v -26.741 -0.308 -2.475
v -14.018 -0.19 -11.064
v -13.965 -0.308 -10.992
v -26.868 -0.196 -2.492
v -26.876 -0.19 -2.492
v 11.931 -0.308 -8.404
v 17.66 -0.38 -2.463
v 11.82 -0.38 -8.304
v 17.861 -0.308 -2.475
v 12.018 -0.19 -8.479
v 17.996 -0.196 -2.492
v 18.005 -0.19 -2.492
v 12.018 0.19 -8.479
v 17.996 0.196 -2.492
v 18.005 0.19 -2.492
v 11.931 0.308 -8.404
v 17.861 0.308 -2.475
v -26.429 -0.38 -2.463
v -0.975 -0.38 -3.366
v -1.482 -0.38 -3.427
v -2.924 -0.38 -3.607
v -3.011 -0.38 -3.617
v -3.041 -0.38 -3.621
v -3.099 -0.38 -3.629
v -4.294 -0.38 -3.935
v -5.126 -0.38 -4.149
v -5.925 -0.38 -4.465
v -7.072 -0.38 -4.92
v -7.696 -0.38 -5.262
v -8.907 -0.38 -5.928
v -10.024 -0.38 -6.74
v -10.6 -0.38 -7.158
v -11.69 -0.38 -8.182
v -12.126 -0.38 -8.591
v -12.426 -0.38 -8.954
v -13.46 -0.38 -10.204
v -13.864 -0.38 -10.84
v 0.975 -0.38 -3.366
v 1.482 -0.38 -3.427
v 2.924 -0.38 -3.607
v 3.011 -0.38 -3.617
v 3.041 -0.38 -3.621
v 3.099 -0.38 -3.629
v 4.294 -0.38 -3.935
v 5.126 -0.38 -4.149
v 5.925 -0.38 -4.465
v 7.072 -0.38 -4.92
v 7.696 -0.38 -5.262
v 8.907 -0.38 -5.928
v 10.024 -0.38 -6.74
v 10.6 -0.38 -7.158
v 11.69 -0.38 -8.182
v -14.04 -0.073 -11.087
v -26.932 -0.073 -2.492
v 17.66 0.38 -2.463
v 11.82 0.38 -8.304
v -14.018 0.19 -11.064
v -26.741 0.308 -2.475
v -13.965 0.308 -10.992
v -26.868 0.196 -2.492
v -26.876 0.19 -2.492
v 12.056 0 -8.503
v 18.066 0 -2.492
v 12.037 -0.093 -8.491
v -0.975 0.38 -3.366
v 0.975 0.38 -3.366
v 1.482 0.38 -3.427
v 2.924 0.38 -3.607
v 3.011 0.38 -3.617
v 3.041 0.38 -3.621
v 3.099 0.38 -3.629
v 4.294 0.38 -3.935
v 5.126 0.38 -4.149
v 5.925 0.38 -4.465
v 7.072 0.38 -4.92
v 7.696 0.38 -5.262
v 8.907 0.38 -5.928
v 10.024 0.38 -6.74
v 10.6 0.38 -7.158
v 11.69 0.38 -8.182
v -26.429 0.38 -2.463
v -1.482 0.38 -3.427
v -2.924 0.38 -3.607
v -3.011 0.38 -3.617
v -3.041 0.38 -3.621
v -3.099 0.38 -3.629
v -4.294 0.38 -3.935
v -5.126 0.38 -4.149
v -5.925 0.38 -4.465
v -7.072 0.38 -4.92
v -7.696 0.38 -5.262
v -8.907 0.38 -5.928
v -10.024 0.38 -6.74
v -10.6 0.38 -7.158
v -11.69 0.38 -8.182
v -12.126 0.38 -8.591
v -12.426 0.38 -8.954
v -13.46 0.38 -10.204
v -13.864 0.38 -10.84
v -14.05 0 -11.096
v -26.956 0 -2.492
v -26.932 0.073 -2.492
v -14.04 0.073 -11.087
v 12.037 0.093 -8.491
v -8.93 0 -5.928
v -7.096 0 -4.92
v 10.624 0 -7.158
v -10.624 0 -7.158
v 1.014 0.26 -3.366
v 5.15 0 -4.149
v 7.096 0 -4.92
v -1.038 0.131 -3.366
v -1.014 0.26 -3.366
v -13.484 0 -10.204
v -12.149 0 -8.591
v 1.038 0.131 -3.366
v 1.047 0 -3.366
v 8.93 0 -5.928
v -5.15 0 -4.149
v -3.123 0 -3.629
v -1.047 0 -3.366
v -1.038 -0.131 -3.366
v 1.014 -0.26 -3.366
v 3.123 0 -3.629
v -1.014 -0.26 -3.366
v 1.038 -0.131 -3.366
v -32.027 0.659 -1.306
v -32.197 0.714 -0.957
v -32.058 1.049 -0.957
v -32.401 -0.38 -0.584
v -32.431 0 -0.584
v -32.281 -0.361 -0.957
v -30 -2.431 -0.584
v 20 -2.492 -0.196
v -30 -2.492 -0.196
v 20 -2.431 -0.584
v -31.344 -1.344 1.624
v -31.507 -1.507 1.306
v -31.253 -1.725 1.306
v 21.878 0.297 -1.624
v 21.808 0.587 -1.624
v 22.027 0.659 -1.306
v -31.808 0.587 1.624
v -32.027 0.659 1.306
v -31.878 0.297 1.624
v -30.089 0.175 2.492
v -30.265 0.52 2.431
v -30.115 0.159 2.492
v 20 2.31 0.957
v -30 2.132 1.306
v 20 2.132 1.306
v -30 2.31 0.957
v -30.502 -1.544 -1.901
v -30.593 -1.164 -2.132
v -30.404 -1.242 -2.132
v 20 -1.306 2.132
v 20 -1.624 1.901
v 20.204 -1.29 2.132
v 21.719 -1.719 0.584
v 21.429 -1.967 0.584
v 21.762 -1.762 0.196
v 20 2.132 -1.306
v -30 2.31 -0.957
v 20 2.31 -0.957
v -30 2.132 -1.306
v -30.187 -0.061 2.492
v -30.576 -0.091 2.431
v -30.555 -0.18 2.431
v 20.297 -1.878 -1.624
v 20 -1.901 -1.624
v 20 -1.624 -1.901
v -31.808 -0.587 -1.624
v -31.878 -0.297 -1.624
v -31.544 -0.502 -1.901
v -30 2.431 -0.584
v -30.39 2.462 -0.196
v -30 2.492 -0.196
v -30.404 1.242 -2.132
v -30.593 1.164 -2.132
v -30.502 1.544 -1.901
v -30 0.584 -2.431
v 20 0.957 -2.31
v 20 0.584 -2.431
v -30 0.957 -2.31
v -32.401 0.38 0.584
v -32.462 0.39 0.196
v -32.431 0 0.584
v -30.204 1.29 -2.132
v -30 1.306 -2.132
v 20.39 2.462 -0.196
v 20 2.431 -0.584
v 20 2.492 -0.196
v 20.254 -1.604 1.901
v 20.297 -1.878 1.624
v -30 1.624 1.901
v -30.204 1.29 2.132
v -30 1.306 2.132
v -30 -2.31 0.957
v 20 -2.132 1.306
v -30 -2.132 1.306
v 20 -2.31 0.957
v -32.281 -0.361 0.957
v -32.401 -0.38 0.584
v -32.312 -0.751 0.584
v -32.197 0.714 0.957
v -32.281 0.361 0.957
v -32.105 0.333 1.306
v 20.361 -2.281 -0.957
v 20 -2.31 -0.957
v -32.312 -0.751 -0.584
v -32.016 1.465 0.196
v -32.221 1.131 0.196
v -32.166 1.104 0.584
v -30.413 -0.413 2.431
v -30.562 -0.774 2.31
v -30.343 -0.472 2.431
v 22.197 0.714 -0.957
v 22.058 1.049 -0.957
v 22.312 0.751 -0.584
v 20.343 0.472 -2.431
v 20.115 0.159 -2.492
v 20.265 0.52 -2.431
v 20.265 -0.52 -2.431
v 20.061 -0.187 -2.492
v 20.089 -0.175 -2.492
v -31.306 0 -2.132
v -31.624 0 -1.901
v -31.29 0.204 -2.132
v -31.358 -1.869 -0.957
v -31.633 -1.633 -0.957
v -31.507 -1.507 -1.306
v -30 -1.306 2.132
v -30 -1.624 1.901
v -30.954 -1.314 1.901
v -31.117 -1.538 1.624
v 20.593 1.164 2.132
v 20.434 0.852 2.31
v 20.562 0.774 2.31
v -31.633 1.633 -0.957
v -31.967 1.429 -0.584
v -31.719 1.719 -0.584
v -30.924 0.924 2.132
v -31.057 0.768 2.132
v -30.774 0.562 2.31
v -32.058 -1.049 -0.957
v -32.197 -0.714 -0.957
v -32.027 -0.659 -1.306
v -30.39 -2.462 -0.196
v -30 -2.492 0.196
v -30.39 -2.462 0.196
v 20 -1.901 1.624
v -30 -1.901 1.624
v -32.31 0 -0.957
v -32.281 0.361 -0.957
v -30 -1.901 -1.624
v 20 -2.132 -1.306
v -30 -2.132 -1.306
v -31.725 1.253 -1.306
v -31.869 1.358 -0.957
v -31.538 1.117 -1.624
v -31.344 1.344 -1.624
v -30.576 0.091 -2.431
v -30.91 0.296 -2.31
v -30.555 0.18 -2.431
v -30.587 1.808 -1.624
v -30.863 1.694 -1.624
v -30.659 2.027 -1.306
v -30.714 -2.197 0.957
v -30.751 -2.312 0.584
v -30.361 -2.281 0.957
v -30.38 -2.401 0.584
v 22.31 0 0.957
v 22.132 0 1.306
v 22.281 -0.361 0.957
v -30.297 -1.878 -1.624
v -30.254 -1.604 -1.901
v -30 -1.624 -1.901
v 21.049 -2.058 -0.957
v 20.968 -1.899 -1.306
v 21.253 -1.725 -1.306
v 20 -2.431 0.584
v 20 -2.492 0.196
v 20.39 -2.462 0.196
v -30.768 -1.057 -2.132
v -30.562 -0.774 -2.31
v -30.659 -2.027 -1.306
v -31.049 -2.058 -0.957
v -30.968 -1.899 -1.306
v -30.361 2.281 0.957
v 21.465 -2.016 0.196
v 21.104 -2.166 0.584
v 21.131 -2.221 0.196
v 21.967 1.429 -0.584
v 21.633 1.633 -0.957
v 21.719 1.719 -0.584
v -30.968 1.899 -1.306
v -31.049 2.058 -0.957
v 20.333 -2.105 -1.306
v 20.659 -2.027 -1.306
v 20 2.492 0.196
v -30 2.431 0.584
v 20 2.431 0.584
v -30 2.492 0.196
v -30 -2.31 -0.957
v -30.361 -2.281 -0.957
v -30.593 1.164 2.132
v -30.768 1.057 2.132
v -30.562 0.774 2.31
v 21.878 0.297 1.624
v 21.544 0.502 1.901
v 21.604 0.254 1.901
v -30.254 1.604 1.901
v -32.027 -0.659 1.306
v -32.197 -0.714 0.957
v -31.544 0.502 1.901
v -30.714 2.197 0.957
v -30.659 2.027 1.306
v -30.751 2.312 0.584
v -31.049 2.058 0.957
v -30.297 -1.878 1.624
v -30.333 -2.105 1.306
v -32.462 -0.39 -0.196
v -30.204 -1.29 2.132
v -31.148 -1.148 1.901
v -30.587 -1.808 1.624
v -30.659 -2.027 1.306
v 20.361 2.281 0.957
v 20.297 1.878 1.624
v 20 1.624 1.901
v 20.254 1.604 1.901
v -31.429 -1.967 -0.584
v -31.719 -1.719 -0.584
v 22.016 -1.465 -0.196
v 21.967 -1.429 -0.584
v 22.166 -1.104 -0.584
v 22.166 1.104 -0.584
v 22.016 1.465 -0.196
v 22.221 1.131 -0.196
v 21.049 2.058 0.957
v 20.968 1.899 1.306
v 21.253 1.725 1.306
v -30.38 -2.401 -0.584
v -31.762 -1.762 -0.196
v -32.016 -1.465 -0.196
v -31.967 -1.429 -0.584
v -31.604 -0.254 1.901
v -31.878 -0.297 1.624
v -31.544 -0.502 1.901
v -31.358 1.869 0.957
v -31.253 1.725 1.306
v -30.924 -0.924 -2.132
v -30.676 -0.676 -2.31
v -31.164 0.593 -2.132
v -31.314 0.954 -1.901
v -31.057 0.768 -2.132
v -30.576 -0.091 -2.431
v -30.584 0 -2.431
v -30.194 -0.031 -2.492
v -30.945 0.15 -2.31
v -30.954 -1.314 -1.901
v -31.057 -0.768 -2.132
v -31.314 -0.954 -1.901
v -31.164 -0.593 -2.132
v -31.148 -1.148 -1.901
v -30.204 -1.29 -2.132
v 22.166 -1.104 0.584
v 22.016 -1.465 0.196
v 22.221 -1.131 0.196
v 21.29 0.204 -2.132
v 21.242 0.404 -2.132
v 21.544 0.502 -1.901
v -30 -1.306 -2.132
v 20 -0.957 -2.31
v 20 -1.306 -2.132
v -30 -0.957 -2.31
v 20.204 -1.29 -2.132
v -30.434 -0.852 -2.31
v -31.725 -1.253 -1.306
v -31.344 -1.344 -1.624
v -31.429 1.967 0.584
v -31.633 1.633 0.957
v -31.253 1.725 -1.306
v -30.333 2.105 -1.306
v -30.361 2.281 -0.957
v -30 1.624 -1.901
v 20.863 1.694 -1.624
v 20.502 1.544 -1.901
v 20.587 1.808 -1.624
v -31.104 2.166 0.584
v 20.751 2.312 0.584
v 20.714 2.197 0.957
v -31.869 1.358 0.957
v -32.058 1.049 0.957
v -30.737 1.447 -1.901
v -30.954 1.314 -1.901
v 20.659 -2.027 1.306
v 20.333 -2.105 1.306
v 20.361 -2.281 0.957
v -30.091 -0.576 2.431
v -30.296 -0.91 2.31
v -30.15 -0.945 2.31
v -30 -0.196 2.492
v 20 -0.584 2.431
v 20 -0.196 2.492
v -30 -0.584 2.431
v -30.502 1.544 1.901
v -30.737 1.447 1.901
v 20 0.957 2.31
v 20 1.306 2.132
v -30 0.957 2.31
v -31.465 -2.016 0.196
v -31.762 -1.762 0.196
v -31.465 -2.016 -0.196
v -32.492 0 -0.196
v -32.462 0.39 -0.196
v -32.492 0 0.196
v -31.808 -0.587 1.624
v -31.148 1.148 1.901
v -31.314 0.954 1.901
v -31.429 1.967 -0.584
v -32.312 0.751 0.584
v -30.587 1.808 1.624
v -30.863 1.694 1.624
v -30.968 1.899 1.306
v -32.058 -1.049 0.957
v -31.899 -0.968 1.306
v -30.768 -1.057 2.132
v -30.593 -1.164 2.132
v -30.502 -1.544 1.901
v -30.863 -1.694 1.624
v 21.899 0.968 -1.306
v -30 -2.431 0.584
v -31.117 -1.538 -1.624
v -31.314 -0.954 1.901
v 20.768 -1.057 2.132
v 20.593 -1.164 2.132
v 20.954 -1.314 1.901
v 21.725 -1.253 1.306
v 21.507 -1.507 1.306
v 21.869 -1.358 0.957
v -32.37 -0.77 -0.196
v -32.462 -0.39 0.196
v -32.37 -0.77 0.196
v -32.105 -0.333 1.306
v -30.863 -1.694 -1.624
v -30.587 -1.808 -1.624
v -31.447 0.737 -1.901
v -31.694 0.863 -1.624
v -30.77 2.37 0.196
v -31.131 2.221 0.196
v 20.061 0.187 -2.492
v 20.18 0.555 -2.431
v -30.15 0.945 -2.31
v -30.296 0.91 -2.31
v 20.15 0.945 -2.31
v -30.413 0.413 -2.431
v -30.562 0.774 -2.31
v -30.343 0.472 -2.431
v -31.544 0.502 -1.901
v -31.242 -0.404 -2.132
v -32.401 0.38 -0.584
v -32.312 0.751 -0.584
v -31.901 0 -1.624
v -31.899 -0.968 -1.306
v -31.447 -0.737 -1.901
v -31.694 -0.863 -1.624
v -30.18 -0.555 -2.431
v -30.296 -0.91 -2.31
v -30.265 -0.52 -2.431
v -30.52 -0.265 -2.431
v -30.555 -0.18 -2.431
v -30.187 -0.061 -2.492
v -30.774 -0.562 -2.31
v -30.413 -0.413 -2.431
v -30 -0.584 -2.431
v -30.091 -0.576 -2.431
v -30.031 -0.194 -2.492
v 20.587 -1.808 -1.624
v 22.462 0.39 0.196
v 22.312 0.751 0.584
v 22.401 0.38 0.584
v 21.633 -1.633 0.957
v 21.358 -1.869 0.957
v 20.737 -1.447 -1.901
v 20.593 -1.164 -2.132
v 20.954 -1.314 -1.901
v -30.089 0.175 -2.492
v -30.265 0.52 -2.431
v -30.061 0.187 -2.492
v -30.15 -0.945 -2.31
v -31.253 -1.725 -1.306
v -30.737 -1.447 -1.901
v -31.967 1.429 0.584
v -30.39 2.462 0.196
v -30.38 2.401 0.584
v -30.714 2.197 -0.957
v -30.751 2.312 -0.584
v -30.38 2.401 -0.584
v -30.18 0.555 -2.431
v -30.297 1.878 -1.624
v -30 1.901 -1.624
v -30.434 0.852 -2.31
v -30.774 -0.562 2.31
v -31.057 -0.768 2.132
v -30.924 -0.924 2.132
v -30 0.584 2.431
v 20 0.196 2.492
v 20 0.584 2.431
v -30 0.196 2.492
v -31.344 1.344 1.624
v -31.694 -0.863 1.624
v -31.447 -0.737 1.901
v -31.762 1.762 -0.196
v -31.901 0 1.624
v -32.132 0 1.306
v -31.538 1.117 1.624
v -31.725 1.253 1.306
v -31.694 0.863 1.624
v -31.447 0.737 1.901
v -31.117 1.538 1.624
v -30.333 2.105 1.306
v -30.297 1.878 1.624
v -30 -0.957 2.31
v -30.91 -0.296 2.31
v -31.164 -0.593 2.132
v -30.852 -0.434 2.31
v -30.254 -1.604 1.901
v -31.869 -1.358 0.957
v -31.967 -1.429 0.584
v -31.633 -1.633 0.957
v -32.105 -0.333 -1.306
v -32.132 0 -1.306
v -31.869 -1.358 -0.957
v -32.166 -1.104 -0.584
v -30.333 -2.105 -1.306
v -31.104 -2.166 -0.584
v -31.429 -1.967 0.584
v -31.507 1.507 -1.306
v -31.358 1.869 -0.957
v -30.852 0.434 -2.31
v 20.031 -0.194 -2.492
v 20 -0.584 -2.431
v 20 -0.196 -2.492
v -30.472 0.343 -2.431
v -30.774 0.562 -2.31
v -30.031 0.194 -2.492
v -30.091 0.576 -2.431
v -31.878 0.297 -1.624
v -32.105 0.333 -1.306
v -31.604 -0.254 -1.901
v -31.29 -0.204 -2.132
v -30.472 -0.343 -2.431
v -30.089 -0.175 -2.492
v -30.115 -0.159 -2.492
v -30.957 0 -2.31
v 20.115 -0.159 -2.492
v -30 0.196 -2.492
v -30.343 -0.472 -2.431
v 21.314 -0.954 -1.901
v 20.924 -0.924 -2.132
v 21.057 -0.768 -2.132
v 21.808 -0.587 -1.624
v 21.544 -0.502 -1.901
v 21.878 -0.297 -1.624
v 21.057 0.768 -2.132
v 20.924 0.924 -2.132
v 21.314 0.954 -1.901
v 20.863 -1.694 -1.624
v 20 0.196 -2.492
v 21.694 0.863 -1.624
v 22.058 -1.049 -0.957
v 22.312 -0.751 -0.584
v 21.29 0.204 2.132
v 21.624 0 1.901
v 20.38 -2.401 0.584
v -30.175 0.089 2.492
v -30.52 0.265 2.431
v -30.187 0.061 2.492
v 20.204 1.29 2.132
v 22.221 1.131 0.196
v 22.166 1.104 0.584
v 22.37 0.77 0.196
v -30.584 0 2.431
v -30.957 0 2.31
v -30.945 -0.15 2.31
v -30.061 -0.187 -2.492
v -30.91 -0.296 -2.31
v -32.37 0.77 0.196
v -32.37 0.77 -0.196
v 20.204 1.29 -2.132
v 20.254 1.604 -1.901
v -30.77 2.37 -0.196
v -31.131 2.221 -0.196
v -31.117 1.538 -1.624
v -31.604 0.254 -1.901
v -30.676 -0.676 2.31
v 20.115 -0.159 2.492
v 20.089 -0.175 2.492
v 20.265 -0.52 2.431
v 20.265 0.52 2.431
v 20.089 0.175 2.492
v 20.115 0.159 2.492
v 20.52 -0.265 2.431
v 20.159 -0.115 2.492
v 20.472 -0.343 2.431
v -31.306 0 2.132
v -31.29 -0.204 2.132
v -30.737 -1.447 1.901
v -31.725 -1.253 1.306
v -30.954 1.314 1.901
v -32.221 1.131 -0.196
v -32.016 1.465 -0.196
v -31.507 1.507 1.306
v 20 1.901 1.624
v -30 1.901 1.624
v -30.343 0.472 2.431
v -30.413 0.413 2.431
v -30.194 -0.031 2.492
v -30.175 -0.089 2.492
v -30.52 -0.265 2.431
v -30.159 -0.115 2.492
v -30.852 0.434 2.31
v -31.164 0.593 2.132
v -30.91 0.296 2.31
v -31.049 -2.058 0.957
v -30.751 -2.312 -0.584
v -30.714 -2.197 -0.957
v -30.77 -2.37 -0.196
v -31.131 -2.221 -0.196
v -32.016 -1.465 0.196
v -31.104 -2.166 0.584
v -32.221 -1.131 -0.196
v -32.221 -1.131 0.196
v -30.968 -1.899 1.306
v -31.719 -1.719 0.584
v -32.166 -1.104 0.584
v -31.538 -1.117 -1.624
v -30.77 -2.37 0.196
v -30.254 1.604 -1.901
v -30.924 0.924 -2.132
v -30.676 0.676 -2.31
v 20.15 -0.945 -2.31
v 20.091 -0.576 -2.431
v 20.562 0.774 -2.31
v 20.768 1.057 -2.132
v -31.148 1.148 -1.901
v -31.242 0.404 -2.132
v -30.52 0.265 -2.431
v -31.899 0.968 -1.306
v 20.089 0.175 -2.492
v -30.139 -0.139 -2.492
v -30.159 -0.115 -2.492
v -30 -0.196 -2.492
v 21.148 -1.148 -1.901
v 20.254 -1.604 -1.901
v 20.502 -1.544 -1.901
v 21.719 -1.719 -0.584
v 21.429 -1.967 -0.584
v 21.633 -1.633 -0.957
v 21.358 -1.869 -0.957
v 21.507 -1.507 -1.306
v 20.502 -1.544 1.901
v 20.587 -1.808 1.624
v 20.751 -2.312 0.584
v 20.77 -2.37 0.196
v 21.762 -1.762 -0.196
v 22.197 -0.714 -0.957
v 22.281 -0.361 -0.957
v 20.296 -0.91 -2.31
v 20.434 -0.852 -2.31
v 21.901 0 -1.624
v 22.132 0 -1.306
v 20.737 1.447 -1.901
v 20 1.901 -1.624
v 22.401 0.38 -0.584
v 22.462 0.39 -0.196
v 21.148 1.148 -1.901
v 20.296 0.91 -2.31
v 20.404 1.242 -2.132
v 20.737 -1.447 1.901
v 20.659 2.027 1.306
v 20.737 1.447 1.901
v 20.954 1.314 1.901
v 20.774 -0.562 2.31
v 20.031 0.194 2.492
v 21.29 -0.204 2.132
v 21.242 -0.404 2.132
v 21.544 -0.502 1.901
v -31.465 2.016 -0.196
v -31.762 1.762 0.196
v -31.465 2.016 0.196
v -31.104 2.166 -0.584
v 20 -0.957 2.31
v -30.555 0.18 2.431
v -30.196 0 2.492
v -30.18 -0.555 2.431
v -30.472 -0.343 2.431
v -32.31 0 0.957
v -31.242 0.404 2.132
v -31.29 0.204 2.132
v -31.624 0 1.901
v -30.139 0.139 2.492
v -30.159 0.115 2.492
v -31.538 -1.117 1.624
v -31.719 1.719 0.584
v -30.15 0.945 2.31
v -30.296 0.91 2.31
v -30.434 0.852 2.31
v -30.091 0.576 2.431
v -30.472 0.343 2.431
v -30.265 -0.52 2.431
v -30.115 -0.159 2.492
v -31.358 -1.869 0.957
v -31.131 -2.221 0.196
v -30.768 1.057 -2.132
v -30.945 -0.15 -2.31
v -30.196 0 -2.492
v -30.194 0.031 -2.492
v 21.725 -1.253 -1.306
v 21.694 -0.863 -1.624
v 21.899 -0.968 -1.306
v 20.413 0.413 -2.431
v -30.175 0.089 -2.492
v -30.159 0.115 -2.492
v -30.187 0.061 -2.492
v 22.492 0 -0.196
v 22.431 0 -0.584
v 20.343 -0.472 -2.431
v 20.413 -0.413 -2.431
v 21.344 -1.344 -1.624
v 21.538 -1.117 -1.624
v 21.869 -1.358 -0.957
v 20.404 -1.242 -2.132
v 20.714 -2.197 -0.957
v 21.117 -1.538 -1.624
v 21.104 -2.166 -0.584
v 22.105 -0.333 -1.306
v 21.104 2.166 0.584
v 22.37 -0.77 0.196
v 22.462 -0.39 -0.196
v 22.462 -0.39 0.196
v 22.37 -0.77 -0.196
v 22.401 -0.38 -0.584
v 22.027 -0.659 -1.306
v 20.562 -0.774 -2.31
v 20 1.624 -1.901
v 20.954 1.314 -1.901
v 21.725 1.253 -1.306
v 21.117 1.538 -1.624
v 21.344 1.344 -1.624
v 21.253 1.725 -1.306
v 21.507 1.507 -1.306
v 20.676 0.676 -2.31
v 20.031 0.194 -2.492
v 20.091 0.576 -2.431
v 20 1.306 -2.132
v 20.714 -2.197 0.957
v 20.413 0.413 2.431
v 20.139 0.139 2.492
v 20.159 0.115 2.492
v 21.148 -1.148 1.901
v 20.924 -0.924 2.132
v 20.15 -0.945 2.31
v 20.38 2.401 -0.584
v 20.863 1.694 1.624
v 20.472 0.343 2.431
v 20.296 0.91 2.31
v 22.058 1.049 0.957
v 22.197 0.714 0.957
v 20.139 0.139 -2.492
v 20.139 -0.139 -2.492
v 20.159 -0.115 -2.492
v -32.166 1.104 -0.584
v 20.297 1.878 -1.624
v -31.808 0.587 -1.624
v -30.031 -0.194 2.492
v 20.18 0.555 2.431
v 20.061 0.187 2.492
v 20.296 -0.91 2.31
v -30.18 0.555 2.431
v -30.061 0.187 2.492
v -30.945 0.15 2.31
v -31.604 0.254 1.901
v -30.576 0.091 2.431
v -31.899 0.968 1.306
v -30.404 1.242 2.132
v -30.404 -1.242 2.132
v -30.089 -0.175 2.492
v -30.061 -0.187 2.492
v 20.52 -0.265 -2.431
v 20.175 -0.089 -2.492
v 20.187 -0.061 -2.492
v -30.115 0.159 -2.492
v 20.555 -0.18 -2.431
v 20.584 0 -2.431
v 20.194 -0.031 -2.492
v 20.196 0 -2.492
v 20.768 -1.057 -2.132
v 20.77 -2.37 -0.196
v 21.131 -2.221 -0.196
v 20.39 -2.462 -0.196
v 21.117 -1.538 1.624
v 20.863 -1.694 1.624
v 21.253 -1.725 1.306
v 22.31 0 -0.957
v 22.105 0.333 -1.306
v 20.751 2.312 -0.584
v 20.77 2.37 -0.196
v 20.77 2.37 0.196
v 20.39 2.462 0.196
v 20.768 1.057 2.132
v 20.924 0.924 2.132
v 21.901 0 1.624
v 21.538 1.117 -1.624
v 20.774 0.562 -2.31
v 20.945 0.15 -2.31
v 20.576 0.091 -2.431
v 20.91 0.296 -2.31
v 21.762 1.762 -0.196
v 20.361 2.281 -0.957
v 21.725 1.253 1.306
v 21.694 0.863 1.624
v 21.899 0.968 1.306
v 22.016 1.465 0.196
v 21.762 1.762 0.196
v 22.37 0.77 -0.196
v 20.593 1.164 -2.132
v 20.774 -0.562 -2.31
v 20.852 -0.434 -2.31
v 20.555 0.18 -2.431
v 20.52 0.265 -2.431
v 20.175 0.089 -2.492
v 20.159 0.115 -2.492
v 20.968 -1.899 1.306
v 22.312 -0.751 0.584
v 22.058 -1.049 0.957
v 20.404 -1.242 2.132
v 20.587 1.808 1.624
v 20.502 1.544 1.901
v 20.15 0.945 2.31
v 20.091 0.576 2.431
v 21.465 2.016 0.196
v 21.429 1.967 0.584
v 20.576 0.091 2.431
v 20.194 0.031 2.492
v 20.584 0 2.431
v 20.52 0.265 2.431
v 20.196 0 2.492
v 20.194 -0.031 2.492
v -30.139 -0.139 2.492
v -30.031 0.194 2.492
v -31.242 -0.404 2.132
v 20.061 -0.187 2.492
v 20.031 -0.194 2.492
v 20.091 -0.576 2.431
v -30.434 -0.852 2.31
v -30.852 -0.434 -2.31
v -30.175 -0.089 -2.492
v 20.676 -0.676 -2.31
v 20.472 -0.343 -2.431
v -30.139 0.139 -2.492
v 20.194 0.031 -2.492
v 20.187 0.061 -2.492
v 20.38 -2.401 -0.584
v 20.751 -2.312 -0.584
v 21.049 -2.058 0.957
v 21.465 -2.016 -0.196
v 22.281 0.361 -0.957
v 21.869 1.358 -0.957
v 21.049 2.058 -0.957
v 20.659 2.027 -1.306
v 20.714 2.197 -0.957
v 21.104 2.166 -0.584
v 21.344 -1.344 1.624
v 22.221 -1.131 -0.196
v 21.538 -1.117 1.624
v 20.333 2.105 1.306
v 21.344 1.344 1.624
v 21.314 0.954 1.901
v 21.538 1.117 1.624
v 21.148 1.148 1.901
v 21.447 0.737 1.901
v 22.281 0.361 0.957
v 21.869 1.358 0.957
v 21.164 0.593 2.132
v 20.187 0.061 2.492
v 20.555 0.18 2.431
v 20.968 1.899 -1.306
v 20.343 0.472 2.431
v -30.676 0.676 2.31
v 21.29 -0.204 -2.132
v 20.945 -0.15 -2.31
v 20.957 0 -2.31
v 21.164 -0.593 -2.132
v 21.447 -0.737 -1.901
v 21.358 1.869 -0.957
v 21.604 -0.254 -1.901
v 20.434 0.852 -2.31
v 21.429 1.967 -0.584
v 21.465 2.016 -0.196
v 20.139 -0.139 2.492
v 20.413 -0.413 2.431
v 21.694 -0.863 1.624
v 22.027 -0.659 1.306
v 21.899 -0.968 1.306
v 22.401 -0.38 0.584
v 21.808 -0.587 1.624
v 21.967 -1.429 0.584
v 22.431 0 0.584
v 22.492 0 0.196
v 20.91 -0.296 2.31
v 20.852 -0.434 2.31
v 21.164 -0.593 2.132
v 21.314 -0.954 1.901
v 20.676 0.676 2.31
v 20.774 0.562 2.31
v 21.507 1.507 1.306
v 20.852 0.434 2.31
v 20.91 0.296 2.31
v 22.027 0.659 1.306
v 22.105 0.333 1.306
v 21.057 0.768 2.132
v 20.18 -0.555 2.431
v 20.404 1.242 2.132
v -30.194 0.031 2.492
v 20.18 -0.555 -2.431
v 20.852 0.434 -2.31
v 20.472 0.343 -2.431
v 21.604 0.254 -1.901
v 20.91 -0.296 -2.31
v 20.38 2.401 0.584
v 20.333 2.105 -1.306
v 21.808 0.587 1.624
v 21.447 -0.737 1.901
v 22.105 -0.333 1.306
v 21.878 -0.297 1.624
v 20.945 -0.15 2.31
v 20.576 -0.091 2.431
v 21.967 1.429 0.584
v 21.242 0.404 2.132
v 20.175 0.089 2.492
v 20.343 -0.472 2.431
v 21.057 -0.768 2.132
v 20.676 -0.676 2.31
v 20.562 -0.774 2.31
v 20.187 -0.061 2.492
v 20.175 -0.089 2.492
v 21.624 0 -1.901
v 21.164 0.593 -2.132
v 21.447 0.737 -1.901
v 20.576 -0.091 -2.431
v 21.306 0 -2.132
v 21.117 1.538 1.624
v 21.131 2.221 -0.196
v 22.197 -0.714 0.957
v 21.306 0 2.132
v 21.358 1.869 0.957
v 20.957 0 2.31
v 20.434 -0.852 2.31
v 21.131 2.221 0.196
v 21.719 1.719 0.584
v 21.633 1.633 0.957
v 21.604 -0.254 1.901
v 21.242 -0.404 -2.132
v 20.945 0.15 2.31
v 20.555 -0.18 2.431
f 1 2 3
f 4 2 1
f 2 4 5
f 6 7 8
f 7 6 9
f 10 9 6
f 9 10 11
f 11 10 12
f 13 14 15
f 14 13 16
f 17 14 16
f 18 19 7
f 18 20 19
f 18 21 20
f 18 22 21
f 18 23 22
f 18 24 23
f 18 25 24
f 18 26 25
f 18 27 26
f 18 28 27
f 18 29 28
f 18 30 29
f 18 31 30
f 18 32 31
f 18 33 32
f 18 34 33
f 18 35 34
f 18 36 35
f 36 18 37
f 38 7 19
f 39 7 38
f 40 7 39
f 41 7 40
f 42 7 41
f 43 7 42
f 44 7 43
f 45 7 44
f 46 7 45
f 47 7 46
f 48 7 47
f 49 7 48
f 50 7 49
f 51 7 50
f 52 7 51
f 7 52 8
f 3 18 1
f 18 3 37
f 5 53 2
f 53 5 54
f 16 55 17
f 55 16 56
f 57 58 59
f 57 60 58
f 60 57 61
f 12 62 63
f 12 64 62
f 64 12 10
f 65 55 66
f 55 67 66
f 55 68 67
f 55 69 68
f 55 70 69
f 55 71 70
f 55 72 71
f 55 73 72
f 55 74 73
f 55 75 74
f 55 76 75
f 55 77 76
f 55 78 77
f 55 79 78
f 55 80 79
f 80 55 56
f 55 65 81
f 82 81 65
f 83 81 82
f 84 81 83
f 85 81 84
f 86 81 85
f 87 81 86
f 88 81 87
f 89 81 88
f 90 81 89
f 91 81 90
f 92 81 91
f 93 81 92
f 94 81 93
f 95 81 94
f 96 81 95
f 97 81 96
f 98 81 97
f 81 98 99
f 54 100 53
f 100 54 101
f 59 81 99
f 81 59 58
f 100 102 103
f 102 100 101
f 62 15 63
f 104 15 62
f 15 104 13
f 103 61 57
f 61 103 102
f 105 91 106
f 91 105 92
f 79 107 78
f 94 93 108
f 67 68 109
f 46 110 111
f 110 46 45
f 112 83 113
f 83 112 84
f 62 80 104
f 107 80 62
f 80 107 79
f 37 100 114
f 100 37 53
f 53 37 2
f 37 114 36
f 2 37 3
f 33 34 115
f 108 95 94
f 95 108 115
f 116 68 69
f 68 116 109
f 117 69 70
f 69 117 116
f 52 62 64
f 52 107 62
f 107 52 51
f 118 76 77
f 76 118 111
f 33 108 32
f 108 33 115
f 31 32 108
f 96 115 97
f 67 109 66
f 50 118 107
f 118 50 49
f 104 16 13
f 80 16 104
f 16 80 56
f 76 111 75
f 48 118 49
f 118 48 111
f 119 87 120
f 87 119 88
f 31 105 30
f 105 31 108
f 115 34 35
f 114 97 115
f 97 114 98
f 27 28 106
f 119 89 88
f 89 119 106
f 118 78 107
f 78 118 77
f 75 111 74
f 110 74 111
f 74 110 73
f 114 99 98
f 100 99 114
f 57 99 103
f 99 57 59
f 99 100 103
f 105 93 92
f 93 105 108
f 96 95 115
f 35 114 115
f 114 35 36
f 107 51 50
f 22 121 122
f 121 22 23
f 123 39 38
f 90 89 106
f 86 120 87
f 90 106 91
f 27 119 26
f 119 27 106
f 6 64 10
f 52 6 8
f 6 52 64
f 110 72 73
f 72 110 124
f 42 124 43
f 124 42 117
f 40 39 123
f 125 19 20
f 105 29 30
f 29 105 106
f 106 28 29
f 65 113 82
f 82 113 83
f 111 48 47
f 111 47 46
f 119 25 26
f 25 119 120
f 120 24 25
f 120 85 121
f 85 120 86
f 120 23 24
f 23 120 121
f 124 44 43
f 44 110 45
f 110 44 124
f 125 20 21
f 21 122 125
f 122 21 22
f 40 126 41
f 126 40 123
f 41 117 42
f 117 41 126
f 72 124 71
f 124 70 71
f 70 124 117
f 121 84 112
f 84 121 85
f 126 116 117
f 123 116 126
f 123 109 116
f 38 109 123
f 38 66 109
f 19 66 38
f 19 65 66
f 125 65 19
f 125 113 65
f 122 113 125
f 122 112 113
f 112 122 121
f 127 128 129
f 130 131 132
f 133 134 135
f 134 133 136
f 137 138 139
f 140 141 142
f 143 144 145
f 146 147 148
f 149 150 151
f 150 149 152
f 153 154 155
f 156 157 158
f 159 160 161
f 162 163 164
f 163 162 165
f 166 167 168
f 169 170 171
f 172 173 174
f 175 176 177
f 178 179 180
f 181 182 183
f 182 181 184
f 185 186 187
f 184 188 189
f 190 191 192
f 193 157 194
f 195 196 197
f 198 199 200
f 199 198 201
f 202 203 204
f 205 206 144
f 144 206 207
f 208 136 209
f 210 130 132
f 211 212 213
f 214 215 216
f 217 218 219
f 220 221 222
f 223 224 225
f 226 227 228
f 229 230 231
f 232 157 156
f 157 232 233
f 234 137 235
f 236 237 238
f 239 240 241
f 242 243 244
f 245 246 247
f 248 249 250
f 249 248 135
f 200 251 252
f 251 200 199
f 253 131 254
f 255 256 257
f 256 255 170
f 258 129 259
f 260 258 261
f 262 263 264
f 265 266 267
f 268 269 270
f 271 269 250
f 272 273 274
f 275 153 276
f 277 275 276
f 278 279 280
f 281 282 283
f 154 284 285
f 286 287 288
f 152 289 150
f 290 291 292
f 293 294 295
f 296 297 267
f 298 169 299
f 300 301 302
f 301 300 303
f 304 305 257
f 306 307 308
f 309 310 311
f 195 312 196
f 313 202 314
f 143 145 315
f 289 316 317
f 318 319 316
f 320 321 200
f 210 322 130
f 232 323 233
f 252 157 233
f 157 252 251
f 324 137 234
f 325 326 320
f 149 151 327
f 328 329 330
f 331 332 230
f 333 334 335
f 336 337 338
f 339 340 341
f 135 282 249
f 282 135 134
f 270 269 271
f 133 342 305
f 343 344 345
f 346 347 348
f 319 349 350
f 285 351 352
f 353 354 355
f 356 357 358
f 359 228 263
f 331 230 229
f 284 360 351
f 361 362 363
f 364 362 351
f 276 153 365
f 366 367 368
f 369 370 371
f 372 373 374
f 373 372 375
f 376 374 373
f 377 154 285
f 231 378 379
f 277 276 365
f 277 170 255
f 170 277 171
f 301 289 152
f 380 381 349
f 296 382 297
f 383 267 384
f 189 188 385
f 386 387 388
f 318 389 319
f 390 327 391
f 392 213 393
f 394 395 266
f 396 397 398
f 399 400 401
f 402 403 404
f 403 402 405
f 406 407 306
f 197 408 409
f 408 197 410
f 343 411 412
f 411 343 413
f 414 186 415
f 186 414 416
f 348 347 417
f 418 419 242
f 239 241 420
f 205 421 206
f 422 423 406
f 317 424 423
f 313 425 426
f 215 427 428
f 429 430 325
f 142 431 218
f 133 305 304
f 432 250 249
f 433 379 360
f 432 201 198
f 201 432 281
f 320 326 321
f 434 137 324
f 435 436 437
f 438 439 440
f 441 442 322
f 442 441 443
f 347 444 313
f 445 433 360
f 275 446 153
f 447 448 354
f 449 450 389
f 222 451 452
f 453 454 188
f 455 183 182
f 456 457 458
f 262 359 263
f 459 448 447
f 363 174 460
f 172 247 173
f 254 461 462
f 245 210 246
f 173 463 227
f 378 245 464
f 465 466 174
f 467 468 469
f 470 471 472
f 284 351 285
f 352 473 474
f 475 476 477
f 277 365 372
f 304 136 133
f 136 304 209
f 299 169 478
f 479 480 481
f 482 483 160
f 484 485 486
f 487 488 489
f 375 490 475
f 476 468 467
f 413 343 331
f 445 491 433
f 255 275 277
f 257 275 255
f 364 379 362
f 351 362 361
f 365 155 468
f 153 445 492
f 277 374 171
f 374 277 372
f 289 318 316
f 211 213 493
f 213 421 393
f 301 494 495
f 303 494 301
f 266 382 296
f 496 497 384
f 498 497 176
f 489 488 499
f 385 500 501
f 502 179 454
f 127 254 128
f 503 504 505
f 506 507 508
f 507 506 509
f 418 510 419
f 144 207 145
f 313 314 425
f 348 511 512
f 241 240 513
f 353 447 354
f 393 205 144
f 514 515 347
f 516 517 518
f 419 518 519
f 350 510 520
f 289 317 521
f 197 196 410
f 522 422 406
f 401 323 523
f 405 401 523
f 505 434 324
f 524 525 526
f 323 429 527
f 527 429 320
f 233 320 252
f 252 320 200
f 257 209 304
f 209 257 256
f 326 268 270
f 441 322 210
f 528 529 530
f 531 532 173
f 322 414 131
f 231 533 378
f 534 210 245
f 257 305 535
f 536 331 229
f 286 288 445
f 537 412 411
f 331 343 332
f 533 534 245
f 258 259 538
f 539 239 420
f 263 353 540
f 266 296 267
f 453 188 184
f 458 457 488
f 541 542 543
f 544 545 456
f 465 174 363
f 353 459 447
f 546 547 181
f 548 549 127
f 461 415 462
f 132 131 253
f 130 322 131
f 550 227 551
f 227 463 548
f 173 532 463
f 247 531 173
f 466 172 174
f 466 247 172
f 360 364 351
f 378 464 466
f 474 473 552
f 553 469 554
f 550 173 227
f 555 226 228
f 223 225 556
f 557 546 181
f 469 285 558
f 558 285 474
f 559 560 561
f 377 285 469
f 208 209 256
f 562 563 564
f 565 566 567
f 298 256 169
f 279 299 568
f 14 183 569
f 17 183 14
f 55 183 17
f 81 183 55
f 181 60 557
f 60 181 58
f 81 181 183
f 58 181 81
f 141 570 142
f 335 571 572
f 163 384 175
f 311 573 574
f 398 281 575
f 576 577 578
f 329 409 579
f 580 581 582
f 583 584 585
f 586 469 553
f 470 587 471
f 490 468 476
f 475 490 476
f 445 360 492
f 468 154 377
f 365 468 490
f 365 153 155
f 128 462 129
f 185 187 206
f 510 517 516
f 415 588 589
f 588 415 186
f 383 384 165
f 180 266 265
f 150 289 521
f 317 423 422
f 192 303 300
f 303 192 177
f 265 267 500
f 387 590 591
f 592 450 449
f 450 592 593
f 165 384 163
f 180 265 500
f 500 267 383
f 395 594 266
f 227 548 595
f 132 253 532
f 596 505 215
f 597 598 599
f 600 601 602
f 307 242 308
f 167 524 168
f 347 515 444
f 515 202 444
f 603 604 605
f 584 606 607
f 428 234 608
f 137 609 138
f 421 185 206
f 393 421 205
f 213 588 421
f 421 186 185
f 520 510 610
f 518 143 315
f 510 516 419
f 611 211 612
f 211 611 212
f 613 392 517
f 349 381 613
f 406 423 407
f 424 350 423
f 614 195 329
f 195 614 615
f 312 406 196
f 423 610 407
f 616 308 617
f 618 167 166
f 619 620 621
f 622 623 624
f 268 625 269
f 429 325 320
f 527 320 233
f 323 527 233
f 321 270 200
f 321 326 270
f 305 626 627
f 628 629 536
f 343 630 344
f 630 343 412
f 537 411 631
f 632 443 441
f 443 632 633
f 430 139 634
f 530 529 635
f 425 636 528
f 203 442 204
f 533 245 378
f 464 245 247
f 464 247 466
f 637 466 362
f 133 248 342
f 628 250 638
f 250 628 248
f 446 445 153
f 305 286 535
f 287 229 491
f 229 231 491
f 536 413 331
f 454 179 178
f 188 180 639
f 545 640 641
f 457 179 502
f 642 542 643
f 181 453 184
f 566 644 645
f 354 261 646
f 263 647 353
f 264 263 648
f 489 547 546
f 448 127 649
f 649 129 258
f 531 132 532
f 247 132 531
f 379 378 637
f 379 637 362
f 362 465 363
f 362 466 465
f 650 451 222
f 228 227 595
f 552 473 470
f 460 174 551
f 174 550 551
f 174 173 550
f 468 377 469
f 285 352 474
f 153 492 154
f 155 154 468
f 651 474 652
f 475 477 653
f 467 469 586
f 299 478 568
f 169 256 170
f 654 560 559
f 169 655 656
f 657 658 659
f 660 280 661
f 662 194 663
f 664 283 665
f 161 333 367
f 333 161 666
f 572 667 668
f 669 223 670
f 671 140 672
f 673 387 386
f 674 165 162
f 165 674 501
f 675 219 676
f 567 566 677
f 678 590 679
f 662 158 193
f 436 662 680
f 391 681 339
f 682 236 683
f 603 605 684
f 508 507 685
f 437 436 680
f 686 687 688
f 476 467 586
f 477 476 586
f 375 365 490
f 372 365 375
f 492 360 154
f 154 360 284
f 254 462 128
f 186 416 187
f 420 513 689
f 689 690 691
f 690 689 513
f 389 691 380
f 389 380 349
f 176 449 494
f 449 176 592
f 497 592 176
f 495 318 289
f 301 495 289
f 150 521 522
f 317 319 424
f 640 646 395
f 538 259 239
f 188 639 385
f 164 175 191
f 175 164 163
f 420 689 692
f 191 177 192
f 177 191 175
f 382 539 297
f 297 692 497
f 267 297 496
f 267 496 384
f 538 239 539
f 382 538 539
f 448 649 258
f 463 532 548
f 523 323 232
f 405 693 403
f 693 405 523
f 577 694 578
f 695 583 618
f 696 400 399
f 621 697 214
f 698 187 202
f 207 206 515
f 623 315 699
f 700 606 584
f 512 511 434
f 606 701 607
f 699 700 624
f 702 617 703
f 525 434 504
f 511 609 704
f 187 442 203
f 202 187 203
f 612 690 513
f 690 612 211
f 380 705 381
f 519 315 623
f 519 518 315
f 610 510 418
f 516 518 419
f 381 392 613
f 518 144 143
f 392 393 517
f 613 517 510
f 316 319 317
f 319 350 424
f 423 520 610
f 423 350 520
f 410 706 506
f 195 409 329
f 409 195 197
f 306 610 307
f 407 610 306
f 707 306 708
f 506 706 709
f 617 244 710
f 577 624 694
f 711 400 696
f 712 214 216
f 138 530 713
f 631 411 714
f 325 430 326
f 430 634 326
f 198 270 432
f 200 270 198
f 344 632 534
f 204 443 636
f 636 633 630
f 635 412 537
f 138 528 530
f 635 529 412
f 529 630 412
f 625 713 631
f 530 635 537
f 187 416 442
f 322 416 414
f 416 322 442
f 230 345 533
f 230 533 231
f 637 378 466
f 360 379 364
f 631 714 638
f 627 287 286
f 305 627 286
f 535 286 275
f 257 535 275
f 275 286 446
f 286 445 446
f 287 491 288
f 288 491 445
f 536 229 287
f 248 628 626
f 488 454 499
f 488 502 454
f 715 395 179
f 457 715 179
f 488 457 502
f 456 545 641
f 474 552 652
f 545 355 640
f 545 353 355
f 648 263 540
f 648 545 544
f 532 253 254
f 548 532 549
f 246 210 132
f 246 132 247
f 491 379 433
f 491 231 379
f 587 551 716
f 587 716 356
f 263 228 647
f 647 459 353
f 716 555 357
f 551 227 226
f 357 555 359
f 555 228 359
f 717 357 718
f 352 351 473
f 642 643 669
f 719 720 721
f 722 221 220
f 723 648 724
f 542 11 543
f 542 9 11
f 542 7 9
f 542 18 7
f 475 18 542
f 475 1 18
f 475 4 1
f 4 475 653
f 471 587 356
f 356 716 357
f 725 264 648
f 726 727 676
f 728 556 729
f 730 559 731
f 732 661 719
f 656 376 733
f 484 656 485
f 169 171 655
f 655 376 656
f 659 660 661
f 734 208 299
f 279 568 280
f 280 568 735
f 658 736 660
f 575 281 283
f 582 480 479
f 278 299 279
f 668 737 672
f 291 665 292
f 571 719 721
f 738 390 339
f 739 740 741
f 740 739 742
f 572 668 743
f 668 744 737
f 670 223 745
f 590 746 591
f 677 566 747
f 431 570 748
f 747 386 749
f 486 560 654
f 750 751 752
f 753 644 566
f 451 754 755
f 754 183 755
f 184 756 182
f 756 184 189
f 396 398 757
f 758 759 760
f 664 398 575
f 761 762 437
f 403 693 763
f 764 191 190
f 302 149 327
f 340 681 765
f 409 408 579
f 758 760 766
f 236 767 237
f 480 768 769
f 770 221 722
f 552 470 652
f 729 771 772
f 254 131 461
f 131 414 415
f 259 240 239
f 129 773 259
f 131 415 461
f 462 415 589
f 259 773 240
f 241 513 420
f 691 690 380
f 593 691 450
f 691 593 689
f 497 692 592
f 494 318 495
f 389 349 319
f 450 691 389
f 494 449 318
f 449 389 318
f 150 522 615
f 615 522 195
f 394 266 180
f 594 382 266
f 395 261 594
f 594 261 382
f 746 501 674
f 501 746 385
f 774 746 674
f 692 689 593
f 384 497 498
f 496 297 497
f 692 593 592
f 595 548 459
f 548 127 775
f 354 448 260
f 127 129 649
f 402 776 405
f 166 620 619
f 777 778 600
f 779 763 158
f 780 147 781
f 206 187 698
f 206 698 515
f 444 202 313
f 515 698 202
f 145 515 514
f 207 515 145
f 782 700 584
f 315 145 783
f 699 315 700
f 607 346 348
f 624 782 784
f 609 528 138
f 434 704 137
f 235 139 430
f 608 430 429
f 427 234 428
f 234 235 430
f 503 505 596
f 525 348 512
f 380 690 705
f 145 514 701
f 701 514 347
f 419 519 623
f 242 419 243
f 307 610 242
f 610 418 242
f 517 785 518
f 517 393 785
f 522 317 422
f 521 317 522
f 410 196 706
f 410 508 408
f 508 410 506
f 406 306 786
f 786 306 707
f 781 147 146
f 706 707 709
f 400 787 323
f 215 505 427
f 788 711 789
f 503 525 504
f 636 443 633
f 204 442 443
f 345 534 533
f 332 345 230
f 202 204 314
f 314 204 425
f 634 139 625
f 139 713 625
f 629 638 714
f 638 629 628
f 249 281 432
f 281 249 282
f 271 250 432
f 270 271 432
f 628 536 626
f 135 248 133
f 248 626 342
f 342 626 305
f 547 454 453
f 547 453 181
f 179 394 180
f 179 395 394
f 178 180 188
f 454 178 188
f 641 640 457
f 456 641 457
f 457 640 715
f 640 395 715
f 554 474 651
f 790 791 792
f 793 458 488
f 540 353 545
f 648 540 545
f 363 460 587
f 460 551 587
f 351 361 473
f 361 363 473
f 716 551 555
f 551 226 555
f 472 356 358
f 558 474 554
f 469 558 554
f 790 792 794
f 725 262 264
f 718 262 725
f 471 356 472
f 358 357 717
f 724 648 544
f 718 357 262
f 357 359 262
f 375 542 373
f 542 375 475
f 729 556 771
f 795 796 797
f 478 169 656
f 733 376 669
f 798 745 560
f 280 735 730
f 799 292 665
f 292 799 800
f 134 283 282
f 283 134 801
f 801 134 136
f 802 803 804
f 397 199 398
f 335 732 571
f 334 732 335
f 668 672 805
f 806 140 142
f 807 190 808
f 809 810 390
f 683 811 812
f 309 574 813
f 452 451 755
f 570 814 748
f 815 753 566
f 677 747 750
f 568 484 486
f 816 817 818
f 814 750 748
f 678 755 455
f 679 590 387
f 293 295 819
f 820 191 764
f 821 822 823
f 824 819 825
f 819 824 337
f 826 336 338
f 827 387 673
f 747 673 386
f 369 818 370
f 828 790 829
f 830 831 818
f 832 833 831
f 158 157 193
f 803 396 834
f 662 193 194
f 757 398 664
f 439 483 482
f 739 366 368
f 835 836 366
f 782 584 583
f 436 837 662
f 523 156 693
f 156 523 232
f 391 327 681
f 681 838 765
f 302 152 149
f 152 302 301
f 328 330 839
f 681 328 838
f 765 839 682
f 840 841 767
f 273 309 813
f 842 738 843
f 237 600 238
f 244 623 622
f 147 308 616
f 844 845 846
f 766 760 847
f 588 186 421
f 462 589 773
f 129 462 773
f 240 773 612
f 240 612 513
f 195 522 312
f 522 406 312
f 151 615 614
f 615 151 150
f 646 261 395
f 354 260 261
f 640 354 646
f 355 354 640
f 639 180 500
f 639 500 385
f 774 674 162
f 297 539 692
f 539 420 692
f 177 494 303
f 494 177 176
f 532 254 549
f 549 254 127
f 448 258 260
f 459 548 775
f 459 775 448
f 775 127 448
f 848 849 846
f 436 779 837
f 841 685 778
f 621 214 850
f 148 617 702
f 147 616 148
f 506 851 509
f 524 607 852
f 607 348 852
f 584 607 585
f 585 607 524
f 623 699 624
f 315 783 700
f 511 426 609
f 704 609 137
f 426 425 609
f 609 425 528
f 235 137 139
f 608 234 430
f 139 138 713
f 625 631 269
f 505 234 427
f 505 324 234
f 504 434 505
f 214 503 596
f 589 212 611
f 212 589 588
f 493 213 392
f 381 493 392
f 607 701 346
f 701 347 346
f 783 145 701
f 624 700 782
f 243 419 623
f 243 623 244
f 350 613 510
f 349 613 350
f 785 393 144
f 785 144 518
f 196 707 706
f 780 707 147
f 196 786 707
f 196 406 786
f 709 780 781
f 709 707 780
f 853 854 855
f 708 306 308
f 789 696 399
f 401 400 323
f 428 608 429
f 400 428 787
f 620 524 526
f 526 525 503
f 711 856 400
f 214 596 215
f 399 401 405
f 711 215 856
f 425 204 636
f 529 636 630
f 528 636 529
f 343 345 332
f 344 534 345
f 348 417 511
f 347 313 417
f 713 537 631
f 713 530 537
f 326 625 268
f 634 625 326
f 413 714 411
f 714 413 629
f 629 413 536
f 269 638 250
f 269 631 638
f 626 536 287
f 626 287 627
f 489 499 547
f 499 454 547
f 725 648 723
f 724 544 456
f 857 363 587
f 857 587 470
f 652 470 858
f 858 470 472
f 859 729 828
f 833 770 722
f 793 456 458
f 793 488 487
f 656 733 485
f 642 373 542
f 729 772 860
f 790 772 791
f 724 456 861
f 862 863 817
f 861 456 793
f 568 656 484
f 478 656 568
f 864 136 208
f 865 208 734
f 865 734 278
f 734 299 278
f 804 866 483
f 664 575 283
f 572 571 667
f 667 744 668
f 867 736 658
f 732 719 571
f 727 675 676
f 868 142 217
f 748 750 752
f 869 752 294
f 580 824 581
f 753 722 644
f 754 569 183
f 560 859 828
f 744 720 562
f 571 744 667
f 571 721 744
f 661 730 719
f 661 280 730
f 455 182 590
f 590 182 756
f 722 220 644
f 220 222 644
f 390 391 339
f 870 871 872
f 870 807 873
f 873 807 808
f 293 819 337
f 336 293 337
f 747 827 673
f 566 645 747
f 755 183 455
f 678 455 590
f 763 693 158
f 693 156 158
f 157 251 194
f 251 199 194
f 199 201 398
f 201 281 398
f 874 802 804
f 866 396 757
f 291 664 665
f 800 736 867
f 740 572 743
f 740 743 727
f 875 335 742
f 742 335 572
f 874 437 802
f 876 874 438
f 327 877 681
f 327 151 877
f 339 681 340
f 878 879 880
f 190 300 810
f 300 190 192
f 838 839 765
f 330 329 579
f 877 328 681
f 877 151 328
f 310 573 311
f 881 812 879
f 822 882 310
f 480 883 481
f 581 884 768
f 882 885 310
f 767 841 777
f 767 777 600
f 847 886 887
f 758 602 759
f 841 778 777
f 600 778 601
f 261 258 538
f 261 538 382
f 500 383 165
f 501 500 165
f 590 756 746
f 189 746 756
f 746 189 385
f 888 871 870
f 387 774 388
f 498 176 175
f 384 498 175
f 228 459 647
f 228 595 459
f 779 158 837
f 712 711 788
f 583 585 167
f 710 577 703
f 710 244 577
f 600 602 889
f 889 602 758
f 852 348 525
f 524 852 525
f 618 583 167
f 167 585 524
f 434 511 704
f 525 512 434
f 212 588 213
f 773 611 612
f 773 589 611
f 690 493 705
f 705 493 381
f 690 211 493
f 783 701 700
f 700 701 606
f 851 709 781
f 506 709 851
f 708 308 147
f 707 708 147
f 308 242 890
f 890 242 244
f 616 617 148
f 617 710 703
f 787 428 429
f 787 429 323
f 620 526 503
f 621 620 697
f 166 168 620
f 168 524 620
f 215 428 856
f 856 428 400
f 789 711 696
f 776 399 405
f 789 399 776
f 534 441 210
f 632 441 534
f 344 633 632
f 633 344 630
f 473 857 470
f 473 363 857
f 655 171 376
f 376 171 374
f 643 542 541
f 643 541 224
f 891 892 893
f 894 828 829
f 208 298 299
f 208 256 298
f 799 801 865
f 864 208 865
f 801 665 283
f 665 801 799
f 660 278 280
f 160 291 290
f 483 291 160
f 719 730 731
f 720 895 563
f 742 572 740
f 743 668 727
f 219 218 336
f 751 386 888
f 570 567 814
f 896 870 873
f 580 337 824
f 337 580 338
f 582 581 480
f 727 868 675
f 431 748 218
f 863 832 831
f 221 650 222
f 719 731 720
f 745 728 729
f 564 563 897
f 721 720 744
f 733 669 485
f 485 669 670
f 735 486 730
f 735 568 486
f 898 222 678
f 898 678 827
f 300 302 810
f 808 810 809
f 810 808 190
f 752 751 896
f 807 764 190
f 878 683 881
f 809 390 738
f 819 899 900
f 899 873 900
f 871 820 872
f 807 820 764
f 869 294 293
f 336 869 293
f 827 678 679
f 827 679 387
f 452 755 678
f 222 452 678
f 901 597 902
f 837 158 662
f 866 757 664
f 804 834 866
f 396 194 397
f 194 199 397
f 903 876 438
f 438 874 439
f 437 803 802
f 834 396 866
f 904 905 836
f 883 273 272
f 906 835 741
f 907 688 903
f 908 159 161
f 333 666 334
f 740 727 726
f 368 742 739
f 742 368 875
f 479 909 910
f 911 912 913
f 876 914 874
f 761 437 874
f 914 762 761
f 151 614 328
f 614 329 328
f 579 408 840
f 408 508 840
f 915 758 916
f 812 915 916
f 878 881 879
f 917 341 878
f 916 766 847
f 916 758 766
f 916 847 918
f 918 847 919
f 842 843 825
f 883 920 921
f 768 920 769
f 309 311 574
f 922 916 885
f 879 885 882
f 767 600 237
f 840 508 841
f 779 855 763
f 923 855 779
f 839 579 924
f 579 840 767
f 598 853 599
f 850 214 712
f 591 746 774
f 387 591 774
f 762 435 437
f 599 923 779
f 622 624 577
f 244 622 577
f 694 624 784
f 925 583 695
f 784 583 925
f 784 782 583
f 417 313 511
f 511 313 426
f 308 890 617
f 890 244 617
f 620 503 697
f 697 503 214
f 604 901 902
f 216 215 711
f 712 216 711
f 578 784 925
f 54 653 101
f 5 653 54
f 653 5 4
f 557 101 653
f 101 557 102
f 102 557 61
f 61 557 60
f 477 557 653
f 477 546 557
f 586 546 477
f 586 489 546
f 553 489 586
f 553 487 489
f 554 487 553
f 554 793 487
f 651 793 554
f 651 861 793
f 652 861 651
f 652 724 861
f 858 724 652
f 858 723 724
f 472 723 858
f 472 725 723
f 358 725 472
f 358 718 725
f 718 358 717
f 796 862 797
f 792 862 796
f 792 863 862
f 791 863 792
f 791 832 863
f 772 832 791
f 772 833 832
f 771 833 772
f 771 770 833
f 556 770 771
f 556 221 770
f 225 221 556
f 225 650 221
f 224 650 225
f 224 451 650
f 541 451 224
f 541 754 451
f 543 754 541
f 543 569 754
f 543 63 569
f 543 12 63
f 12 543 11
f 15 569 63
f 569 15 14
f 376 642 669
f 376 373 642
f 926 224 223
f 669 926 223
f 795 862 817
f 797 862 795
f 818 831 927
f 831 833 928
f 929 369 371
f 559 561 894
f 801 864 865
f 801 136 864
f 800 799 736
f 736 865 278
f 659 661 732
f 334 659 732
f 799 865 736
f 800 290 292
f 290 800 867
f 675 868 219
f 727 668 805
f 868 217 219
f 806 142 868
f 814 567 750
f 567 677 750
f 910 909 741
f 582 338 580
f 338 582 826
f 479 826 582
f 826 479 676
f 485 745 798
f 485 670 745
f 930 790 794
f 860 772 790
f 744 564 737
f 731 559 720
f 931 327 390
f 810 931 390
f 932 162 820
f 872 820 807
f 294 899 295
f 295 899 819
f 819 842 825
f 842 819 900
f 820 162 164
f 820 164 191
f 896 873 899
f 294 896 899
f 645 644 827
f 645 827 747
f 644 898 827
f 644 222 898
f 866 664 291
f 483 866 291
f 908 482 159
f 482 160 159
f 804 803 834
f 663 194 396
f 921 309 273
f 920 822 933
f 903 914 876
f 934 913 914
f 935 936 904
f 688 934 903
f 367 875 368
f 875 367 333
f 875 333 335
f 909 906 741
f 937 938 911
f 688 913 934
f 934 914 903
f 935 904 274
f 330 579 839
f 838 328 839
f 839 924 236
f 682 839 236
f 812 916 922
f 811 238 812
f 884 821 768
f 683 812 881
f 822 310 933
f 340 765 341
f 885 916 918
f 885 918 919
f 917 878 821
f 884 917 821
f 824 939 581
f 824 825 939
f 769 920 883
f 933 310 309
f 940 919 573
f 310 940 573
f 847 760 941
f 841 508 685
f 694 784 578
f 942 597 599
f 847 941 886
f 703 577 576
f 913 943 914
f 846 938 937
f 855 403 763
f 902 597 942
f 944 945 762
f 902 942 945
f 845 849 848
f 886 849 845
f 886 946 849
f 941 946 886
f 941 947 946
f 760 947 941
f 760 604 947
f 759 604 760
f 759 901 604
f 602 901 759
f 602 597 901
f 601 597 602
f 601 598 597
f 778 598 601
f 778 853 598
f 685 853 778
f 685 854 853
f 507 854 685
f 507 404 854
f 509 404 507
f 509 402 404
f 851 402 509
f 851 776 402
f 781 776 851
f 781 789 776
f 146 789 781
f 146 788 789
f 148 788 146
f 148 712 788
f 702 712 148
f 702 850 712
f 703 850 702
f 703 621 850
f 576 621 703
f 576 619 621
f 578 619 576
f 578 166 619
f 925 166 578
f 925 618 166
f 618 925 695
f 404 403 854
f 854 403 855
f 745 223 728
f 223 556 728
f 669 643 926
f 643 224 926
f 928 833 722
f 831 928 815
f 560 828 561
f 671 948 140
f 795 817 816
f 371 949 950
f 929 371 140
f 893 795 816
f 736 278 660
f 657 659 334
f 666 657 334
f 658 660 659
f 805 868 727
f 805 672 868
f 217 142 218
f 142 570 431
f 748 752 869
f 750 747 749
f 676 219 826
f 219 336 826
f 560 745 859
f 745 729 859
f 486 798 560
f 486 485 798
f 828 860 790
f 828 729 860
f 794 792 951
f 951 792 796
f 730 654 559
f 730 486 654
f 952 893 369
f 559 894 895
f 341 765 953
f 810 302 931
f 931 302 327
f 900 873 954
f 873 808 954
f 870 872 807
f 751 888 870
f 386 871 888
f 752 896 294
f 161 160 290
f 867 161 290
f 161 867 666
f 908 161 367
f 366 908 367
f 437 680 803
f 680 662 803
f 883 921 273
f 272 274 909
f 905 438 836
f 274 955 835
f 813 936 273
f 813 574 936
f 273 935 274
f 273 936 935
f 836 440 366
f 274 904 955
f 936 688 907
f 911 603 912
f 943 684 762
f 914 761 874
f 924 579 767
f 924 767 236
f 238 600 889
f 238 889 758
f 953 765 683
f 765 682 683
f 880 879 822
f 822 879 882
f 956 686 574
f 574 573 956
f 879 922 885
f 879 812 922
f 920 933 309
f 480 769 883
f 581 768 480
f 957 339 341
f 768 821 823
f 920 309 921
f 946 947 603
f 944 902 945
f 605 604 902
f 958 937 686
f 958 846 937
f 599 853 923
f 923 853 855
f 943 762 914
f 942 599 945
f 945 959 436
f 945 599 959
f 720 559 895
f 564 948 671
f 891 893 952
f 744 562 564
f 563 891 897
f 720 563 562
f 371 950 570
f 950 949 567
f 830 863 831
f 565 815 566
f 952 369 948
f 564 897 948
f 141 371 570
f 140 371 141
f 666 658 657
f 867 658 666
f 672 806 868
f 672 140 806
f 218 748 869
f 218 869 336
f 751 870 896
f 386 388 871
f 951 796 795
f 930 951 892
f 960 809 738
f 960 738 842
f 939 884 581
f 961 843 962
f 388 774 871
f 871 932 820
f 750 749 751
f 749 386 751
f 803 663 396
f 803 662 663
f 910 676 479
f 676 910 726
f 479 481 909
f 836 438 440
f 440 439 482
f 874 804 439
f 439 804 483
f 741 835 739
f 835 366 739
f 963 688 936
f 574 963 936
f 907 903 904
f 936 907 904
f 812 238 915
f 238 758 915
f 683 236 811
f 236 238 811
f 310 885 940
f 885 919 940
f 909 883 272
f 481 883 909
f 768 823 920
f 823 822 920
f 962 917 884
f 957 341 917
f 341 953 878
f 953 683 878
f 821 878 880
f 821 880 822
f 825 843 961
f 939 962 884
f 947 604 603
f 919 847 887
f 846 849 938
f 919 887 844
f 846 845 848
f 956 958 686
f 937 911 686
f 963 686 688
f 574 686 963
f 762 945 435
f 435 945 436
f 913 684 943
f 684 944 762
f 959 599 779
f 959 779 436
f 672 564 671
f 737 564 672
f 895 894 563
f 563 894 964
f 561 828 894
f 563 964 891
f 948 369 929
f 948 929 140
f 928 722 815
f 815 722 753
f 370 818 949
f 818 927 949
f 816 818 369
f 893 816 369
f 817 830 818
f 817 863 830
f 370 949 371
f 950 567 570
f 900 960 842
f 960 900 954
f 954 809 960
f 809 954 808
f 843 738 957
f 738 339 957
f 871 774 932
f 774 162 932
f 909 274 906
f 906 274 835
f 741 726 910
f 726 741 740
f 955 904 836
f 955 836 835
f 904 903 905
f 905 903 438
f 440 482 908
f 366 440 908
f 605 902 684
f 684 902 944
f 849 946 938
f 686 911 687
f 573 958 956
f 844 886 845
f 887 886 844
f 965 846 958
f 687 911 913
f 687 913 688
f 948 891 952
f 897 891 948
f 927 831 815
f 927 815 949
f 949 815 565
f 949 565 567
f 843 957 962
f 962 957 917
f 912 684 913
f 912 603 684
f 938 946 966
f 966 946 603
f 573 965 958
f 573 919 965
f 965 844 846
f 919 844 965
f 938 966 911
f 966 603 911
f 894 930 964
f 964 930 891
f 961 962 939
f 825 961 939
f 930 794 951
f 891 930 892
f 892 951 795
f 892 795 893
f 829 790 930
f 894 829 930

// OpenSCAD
// Edge strut diameter (mm).
EDGE_SEG_EDGE_T = 3;
// Support fin diameter (mm).
EDGE_SEG_FIN_T = 0.8;
EDGE_SEG_SCALE_Y = 2;

module edge_seg(endPoints, pc, edge_t = EDGE_SEG_EDGE_T, fin_t = EDGE_SEG_FIN_T) {
    translate([0, 0, 0]) {
        // builds the edge bar itself
        hull() {
            translate(endPoints[0]) sphere(d = edge_t, $fn = 40);
            translate(endPoints[1]) sphere(d = edge_t, $fn = 40);
        }
        
        // creates the support fin under the edge - goes to centre of poly
        if (fin_t > 0) {
            difference() {
                hull() {
                    translate(endPoints[0]) sphere(d = fin_t, $fn = 10);
                    translate(endPoints[1]) sphere(d = fin_t, $fn = 10);
                    translate(pc) sphere(d = fin_t, $fn = 10);
                }
                translate(pc) sphere(r = norm(pc) * 5/6, $fn = 50);
            }
        }
    }
} 

edge_seg([[-30,0,0], [20,0,0]], [0,0,-20], 5);
